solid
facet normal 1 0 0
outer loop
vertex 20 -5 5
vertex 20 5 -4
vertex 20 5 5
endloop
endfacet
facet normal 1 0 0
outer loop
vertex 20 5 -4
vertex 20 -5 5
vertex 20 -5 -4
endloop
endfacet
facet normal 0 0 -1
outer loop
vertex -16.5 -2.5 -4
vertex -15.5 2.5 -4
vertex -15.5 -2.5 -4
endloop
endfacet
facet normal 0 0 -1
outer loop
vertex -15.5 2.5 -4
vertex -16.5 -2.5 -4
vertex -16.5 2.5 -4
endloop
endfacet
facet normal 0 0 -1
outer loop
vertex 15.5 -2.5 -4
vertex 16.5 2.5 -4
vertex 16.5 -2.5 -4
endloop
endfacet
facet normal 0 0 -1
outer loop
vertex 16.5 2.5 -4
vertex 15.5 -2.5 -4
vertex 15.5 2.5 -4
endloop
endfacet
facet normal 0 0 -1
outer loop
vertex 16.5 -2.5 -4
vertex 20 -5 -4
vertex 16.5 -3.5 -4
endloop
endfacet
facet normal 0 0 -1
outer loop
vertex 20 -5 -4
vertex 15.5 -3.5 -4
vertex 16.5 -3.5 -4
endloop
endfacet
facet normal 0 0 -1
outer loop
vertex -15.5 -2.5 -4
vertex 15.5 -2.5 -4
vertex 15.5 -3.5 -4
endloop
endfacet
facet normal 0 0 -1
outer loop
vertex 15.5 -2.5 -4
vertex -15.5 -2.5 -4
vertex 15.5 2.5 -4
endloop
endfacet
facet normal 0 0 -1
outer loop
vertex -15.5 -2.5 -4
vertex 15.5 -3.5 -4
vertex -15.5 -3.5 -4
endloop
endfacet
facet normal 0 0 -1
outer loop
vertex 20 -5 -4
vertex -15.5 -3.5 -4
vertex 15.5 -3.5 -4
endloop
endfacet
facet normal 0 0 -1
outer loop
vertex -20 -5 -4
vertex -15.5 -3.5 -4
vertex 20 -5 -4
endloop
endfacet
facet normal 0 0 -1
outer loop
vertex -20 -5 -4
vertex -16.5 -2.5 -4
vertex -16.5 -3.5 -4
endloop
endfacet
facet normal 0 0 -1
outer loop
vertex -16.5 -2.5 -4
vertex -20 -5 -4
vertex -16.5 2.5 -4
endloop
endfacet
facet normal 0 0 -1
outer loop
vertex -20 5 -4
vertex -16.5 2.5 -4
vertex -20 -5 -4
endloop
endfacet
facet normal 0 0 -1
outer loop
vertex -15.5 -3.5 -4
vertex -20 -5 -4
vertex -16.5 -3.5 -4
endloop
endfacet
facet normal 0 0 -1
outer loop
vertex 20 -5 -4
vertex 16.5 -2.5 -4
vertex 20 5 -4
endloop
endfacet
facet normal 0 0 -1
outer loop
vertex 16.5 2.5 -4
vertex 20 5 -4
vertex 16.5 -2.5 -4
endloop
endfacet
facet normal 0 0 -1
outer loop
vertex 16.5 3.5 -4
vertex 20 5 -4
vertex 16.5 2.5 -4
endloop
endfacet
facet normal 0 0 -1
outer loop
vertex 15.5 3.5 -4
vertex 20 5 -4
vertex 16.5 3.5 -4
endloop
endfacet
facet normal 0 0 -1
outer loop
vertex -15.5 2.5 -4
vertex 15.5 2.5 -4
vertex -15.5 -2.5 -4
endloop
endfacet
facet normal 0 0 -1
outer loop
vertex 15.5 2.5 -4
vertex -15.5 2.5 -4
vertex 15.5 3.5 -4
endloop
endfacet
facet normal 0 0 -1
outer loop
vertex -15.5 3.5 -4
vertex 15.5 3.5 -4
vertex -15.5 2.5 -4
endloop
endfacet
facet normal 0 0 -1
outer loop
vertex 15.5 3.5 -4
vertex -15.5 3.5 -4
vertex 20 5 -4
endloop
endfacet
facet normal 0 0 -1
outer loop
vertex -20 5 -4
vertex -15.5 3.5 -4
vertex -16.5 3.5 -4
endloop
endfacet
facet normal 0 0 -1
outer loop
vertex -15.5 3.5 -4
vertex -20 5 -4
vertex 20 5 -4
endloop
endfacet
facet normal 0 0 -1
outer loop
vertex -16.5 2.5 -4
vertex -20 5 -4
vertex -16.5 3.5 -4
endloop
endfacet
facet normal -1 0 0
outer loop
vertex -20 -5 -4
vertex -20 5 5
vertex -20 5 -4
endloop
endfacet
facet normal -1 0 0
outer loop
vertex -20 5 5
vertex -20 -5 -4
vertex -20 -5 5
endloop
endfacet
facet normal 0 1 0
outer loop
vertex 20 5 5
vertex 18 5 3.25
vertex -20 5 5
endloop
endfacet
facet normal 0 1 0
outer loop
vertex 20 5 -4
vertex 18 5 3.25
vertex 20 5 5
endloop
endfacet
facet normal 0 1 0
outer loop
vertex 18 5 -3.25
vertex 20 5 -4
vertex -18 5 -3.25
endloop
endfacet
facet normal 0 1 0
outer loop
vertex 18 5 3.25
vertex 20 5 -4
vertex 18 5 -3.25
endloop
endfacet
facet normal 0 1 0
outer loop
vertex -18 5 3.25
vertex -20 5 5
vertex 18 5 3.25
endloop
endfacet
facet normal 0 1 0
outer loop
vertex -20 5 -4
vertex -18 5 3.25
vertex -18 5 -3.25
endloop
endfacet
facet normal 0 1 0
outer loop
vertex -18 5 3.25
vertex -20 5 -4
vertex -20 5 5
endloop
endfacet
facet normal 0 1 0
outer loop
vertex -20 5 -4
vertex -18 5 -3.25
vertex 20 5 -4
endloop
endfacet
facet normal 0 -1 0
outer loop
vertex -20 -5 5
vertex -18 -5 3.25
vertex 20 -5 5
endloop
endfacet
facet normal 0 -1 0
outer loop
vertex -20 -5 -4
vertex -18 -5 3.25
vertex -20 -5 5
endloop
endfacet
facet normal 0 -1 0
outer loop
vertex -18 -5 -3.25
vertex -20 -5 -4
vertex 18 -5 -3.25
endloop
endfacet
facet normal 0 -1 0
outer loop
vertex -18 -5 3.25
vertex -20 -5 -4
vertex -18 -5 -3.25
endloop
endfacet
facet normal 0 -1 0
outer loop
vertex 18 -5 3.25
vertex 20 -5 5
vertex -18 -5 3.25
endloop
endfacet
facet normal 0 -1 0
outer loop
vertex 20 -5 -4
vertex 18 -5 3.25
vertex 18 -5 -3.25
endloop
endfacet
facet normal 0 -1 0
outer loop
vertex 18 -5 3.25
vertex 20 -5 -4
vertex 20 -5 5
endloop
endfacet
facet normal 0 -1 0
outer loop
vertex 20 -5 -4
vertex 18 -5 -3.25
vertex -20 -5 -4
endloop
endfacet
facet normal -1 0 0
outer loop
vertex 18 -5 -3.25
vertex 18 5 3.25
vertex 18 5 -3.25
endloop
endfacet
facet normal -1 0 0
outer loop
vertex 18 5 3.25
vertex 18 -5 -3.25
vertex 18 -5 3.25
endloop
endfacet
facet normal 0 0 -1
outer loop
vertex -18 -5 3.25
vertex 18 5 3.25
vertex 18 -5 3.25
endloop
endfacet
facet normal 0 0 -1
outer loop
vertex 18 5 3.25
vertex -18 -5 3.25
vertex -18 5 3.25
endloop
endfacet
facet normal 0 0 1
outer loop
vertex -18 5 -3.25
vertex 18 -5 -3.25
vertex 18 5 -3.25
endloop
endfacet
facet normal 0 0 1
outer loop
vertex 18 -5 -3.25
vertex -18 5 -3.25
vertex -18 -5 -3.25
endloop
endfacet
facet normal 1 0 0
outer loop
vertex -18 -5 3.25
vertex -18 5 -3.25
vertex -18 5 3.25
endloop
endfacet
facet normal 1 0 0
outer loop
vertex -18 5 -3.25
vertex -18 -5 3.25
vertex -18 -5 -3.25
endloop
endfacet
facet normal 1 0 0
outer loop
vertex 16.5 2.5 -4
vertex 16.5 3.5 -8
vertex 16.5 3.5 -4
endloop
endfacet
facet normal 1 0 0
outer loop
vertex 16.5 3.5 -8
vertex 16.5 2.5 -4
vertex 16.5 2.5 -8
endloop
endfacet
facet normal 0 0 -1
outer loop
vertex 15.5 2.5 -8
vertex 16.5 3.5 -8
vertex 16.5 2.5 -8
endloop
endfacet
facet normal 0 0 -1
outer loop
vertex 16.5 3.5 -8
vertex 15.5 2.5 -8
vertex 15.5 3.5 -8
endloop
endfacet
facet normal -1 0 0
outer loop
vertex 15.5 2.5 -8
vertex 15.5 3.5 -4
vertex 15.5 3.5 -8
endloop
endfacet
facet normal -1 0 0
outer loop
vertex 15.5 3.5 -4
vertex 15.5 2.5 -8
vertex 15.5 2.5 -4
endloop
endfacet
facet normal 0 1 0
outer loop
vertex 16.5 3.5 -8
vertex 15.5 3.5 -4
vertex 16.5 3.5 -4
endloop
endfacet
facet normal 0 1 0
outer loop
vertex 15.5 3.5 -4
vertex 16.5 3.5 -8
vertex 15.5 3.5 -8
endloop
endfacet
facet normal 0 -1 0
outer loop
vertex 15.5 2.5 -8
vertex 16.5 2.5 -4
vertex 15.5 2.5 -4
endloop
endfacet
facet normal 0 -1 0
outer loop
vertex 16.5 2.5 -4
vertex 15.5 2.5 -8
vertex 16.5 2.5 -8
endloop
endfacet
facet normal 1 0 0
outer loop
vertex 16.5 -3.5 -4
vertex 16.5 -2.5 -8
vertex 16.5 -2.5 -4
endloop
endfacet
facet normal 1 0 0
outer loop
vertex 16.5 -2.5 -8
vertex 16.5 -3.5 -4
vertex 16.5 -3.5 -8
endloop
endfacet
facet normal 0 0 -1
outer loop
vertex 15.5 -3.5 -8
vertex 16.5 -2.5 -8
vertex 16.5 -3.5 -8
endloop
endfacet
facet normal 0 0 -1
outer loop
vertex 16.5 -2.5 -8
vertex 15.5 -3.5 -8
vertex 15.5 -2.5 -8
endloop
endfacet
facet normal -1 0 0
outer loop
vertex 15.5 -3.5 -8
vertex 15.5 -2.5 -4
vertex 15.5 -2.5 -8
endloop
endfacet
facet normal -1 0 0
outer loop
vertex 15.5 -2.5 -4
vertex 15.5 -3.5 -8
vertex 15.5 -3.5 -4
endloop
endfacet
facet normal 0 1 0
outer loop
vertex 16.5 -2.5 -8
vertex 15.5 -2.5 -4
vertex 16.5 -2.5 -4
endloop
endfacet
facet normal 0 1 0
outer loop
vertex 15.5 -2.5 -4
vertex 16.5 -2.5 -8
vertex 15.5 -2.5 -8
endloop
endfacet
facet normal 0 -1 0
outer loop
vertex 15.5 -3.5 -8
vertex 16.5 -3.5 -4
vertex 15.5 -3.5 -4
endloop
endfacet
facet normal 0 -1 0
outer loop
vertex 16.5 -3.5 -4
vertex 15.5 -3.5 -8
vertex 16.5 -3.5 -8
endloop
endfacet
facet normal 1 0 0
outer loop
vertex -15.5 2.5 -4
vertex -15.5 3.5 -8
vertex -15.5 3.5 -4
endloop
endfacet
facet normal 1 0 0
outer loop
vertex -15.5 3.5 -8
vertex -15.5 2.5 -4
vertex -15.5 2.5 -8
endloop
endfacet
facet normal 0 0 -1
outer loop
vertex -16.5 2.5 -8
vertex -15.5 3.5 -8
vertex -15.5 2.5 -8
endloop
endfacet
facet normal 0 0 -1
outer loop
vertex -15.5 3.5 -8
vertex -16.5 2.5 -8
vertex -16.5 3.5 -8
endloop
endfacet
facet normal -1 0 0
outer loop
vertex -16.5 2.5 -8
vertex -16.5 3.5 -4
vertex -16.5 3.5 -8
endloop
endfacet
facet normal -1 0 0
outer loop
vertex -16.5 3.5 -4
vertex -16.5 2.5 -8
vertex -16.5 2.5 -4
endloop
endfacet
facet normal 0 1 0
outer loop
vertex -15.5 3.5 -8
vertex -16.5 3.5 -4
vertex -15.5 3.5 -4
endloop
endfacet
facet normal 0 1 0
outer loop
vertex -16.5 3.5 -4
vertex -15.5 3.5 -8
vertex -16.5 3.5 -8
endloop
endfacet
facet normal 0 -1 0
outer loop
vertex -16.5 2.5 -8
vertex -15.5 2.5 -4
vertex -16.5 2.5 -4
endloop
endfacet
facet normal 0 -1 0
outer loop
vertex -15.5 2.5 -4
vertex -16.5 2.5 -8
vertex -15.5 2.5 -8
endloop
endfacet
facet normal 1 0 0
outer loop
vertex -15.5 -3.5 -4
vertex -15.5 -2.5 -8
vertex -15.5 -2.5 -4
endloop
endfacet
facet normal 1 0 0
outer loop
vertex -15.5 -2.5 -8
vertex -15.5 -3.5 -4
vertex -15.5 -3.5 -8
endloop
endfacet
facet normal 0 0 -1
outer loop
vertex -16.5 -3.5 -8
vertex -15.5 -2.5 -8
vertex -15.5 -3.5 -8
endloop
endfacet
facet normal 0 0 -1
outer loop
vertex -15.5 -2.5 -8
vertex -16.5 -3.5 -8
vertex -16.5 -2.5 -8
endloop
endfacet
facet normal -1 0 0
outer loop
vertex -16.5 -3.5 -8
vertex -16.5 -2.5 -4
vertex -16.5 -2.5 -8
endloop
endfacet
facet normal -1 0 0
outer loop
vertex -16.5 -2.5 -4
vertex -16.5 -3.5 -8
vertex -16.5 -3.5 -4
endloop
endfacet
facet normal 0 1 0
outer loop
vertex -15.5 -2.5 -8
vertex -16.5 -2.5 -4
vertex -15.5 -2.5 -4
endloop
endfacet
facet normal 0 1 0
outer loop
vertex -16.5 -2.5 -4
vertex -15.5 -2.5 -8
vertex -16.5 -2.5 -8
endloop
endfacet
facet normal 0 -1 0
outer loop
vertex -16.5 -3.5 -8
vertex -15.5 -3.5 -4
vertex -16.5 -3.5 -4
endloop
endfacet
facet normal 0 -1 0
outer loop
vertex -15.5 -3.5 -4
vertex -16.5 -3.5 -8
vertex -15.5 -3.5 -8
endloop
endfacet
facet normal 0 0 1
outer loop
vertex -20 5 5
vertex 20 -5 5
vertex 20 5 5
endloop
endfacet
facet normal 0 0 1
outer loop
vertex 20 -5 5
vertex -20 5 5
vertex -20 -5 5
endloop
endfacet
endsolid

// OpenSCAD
color("#986931")
translate([0,0,4.5]){
cube([40,6,1], center =true);
}

color("#36220b")
translate([0,4,4.5]){
cube([40,2,1], center =true);
}

color("#36220b")
translate([0,-4,4.5]){
cube([40,2,1], center =true);
}

color("#5e3e17")
difference(){
cube([40,10,8], center =true);

cube([36,12,6.5], center =true);
}



color("#1a1818"){
translate([16,3,-6]){
cube([1,1,4], center =true);
}

translate([16,-3,-6]){
cube([1,1,4], center =true);
}

translate([-16,3,-6]){
cube([1,1,4], center =true);
}

translate([-16,-3,-6]){
cube([1,1,4], center =true);
}

}
